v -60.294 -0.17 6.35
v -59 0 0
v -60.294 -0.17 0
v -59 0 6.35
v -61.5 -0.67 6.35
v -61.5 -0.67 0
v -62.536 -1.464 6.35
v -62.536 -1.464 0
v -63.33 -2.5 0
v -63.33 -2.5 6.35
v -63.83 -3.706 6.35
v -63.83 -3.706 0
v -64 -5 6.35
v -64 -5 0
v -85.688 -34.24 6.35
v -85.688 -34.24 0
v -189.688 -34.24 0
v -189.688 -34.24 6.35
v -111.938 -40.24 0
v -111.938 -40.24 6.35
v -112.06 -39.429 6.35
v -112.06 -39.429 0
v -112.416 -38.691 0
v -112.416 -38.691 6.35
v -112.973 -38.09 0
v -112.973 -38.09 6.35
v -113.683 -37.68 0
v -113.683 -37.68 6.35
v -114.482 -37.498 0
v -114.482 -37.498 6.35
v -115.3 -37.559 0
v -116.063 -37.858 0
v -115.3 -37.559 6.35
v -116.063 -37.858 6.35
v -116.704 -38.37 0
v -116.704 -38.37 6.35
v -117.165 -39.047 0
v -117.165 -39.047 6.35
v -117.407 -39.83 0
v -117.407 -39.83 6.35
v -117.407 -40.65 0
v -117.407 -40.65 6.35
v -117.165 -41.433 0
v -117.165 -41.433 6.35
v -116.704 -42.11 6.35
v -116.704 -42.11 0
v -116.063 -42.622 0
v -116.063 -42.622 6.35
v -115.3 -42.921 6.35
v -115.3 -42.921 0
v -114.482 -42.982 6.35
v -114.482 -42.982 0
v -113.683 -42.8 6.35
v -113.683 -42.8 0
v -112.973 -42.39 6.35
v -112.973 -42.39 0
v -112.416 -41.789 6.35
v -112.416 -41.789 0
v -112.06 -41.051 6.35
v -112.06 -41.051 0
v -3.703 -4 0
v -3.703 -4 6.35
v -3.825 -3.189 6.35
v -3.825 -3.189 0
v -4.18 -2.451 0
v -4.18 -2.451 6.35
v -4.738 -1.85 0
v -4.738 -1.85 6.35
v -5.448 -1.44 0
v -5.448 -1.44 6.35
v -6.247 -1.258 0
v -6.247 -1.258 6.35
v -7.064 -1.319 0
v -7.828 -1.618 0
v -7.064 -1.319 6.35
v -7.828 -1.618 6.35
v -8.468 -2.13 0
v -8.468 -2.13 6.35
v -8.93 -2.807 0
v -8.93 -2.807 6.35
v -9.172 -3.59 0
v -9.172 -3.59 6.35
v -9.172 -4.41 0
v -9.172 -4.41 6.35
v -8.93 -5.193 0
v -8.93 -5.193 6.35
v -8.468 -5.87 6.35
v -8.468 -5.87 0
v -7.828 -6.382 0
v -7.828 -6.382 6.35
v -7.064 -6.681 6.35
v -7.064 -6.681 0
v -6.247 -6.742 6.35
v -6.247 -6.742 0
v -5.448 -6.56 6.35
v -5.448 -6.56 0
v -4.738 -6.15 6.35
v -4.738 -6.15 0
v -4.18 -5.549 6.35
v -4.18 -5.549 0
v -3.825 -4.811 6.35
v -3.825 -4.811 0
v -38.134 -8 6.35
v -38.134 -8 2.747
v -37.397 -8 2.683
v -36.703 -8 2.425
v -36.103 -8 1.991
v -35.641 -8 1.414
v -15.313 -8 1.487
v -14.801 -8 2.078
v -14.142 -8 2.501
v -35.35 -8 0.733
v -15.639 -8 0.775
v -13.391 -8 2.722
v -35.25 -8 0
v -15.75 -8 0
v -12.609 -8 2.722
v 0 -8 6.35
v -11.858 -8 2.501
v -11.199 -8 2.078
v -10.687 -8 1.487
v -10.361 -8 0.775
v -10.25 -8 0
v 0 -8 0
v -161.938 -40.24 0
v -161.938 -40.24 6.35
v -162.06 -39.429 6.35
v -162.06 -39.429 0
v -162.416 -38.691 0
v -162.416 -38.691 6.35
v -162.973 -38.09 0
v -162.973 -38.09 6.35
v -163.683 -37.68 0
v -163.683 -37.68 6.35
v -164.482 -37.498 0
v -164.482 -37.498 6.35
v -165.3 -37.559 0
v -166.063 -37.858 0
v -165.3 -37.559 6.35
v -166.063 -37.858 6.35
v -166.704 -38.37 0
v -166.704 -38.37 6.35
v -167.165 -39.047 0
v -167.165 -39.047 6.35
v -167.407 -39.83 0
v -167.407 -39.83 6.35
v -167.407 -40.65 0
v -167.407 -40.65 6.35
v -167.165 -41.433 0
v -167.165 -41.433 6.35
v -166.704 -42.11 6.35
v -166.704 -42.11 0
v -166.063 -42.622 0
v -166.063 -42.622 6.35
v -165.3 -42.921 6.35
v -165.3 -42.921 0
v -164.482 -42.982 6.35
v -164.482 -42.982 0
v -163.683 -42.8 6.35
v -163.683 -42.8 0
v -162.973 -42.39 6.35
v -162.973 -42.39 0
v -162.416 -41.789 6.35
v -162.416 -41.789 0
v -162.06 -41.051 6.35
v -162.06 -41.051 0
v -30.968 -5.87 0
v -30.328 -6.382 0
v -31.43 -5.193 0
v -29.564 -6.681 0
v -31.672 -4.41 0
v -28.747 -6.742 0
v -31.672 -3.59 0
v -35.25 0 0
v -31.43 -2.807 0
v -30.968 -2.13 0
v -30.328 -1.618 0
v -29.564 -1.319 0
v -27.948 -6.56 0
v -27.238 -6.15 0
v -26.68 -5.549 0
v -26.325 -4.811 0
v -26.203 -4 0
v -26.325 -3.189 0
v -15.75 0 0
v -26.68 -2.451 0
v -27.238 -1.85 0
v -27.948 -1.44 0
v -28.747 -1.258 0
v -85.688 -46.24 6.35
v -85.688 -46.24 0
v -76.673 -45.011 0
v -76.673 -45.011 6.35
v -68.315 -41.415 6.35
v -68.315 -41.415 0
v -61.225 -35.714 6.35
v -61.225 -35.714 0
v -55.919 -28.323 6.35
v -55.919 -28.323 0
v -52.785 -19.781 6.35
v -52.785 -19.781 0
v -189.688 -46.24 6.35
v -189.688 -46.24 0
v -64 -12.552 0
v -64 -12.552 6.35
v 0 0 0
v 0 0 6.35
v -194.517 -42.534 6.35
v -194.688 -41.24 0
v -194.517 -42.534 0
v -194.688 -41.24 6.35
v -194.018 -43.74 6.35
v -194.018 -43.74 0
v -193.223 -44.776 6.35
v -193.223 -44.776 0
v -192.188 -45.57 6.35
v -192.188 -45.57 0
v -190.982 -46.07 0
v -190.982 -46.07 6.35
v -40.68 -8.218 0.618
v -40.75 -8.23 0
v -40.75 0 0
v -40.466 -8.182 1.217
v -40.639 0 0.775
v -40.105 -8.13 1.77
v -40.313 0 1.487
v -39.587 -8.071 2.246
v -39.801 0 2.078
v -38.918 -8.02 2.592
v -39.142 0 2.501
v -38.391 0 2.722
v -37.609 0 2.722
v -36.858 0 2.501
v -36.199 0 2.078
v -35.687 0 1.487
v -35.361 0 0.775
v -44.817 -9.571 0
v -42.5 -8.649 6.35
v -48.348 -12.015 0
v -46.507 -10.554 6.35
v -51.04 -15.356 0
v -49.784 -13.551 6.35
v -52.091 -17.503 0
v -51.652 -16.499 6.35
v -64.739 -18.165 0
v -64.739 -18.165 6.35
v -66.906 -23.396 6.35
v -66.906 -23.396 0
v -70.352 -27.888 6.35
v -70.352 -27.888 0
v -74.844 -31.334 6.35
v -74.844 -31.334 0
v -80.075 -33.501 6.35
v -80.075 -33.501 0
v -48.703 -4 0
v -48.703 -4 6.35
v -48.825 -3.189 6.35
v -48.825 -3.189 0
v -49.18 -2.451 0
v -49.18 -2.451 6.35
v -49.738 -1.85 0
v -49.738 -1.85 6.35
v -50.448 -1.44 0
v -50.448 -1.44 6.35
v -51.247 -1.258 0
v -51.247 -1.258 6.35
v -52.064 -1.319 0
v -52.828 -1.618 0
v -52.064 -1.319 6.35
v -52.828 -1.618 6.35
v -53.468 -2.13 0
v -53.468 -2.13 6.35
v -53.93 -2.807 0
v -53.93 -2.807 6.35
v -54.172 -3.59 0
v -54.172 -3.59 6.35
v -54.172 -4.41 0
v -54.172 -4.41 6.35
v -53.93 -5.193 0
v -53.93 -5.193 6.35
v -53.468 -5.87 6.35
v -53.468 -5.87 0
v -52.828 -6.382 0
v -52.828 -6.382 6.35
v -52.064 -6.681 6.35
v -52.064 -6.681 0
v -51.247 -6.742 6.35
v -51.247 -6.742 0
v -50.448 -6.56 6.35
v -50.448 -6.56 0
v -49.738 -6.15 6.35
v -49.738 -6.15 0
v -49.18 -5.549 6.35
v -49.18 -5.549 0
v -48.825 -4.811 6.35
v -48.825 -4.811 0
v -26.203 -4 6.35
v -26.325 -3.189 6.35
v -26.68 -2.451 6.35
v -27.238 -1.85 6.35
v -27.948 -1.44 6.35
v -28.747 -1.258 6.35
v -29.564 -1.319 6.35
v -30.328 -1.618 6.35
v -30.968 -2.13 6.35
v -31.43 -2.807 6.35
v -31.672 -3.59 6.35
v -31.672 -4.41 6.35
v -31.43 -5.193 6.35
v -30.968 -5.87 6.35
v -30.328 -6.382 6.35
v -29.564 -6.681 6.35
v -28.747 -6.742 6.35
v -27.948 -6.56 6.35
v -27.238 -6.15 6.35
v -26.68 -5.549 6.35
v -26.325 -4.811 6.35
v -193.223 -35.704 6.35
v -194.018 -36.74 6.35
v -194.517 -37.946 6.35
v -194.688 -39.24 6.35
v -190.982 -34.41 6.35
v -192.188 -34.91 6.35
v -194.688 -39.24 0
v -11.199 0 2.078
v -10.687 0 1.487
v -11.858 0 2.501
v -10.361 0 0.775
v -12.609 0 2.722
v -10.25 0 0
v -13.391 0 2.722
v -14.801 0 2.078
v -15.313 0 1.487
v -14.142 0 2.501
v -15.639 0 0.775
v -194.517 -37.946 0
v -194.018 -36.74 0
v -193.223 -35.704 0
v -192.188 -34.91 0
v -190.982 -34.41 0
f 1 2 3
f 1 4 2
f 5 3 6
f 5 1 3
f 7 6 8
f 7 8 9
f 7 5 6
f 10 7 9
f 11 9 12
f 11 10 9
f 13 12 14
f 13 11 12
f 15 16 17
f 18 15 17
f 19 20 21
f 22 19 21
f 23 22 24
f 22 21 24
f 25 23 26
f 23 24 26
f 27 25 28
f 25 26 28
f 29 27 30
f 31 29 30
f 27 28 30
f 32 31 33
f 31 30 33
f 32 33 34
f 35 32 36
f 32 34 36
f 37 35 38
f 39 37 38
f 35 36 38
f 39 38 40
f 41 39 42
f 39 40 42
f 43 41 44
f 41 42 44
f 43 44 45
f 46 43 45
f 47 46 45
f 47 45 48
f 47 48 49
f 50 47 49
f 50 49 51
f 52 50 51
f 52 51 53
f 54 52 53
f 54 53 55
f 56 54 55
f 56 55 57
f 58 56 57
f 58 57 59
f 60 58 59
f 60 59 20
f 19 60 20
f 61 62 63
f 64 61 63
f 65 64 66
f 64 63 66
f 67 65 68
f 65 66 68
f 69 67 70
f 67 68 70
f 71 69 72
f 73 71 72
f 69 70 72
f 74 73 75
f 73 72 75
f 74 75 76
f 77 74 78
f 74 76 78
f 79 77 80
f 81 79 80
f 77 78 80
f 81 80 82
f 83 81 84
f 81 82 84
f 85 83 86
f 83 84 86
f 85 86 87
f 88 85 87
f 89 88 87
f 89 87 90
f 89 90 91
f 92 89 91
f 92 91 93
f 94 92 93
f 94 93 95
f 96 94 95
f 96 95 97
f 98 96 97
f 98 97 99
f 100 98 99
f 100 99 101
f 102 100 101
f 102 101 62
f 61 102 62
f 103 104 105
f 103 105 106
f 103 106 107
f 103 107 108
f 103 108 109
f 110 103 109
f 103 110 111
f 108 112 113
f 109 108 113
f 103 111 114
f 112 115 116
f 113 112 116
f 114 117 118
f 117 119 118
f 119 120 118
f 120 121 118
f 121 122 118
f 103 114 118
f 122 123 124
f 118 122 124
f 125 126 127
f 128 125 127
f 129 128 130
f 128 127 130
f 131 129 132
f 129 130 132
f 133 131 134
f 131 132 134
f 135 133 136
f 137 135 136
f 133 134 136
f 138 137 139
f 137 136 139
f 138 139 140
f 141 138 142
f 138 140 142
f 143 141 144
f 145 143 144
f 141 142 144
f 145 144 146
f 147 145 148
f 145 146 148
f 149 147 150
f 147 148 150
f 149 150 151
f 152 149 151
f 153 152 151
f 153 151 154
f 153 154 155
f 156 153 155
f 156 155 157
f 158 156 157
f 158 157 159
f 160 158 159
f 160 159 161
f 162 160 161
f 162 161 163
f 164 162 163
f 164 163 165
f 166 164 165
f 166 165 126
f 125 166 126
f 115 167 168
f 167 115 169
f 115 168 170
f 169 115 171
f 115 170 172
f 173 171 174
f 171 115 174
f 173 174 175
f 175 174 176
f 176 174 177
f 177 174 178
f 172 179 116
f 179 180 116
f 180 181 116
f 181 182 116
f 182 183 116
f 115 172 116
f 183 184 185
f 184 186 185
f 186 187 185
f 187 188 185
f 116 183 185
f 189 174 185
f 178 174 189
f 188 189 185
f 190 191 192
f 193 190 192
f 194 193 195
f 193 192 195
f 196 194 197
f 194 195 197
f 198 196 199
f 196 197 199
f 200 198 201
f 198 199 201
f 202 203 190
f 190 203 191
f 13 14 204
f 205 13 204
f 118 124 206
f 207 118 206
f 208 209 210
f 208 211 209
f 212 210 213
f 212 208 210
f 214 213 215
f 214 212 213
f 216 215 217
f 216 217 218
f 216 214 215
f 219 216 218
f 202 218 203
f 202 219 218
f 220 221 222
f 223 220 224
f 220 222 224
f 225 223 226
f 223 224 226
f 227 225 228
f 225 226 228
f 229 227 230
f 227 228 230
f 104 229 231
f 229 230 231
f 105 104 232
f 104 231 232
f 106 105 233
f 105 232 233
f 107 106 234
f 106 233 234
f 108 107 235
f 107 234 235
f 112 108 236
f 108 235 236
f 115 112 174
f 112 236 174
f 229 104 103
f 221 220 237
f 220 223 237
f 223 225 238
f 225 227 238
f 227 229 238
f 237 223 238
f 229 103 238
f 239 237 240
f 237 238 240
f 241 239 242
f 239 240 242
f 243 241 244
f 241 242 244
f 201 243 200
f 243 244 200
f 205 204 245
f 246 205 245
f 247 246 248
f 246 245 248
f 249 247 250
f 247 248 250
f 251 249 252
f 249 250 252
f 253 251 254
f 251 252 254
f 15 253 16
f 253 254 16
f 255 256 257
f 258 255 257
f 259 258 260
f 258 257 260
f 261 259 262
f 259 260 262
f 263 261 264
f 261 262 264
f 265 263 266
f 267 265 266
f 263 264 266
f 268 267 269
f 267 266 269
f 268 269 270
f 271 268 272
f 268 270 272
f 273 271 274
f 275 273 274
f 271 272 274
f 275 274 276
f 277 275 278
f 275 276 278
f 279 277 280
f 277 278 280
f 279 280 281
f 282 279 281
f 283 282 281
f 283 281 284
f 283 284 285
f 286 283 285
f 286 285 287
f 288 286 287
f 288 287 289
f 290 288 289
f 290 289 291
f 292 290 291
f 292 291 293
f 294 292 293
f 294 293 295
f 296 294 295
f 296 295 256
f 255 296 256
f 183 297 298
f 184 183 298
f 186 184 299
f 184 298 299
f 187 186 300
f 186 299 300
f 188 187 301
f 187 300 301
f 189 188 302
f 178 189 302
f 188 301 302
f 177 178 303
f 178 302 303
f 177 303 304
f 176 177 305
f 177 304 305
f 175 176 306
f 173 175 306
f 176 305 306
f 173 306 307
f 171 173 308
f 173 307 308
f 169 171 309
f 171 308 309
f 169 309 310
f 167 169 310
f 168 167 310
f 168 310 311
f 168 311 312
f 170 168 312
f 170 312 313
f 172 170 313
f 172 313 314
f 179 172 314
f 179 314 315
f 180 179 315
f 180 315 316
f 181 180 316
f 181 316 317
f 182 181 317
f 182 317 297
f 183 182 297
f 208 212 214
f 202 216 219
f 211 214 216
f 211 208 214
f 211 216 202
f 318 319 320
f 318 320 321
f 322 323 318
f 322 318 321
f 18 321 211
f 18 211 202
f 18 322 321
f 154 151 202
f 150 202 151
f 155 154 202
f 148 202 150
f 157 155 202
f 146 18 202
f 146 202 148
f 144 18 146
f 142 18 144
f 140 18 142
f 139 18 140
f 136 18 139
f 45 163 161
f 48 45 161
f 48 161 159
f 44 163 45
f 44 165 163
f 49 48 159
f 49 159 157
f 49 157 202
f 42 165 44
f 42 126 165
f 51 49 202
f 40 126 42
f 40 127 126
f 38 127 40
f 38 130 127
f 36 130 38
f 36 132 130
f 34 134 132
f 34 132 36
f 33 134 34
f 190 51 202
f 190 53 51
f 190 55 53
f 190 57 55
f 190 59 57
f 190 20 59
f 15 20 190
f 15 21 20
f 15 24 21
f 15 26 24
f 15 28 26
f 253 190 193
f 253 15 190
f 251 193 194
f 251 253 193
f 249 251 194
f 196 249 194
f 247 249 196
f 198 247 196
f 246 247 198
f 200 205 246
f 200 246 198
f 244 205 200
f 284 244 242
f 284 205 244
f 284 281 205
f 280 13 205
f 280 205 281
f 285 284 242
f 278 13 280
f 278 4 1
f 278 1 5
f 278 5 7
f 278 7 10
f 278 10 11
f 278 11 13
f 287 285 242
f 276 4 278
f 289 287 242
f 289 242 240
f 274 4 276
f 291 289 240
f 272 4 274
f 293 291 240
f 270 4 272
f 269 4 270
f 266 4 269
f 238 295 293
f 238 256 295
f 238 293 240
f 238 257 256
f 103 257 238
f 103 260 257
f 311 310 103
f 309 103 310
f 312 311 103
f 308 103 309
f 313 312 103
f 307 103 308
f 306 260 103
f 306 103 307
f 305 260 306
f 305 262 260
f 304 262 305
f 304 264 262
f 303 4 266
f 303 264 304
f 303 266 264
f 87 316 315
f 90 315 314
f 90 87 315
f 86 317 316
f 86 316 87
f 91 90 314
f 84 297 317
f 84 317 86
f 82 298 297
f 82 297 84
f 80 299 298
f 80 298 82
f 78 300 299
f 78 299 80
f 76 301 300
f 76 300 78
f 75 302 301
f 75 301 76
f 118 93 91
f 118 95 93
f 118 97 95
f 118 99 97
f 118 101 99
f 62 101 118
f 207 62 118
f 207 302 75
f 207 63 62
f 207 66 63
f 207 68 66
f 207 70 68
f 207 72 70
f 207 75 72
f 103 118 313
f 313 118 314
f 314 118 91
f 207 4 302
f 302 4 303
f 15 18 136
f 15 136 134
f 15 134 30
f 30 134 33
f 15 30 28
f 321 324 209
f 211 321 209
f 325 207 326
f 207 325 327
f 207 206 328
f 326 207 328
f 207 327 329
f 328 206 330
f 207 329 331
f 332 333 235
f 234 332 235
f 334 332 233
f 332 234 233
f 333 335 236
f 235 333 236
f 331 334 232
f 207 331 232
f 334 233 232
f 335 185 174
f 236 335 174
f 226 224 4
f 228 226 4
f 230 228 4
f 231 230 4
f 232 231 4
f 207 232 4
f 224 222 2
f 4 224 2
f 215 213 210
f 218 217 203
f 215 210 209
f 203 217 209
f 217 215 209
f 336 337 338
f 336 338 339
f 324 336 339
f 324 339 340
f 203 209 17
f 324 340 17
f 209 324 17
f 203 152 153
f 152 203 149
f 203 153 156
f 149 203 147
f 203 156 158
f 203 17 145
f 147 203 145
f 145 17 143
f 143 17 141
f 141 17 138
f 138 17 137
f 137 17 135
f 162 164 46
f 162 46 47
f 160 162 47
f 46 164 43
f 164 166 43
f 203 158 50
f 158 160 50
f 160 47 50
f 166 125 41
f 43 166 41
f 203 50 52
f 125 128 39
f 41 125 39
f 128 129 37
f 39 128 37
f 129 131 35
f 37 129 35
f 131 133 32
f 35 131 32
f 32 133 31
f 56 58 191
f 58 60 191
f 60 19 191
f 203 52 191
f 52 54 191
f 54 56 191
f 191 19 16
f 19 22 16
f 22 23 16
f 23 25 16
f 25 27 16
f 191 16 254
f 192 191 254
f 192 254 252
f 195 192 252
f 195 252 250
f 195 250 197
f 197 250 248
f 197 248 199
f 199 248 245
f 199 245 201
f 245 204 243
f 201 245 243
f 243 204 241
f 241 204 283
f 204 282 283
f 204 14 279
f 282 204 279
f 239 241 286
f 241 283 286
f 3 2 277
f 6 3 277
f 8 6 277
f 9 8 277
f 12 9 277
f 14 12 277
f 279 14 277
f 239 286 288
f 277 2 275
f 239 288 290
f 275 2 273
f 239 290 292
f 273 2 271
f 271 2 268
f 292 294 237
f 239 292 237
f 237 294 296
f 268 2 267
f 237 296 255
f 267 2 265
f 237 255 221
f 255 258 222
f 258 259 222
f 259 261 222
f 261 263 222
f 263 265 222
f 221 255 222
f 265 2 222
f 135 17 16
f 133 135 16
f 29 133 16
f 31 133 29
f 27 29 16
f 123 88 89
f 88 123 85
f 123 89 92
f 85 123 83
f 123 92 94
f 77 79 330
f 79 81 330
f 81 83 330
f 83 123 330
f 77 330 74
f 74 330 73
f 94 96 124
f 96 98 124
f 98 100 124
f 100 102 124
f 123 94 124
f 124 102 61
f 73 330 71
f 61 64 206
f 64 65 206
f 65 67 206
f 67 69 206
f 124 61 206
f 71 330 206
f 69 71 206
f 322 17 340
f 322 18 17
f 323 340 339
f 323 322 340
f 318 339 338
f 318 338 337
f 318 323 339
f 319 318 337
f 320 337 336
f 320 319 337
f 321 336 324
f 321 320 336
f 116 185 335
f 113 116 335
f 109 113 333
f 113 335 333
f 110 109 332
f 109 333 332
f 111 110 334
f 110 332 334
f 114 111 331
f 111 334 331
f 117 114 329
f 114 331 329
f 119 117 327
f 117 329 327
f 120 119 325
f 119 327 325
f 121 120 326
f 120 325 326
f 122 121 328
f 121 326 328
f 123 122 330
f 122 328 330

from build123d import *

# Parameters (mm, degrees)
BOSS_EXTRUDE1_DEPTH = 6.35
FILLET1_R           = 5
FILLET2_R           = 15
SKETCH4_R           = 2.75
CUT_EXTRUDE2_DEPTH  = 10
CUT_EXTRUDE3_REACH  = 48.24
SKETCH3_R           = 2.75


with BuildPart() as part:
    # Sketch1 → Boss-Extrude1 (new body)
    with BuildSketch(Plane.XY):
        with BuildLine():
            Line((0, 0), (-64, 0))
            Line((-64, 0), (-64, -12.552169744))
            ThreePointArc((-64, -12.552169744), (-70.352218413, -27.887781587), (-85.687830256, -34.24))
            Line((-85.687830256, -34.24), (-194.687830256, -34.24))
            Line((-194.687830256, -34.24), (-194.687830256, -46.24))
            Line((-194.687830256, -46.24), (-85.687830256, -46.24))
            ThreePointArc((-85.687830256, -46.24), (-61.866937038, -36.373062962), (-52, -12.552169744))
            Line((-52, -12.552169744), (-52, -8))
            Line((-52, -8), (0, -8))
            Line((0, -8), (0, 0))
        make_face()
    extrude(amount=BOSS_EXTRUDE1_DEPTH)

    # Fillet1
    fillet1_edges = [part.edges().sort_by_distance(p)[0] for p in [
        (-194.687830256, -46.24, 3.175),
        (-194.687830256, -34.24, 3.175),
        (-64, 0, 3.175),
    ]]
    fillet(fillet1_edges, radius=FILLET1_R)

    # Fillet2
    fillet2_edges = [part.edges().sort_by_distance(p)[0] for p in [
        (-52, -8, 3.175),
    ]]
    fillet(fillet2_edges, radius=FILLET2_R)

    # Sketch4 → Cut-Extrude2 (cut)
    with BuildSketch(Plane.XY.offset(6.35)):
        with Locations((-164.687830256, -40.24)):
            Circle(SKETCH4_R)
        with Locations((-114.687830256, -40.24)):
            Circle(SKETCH4_R)
        with Locations((-6.452530622, -4)):
            Circle(SKETCH4_R)
        with Locations((-28.952530622, -4)):
            Circle(SKETCH4_R)
        with Locations((-51.452530622, -4)):
            Circle(SKETCH4_R)
    extrude(amount=-CUT_EXTRUDE2_DEPTH, mode=Mode.SUBTRACT)

    # Sketch3 → Cut-Extrude3 (cut, up to next)
    with BuildSketch(Plane(origin=(0, 0, 0), x_dir=(1, 0, 0), z_dir=(0, 1, 0)), mode=Mode.PRIVATE) as cut_extrude3_sk1:
        with Locations((-13, 0)):
            Circle(SKETCH3_R)
    cut_extrude3_tool1 = extrude(cut_extrude3_sk1.sketch, amount=-CUT_EXTRUDE3_REACH, mode=Mode.PRIVATE) & part.part
    add(cut_extrude3_tool1.solids().sort_by_distance((-13, 0, 0))[0], mode=Mode.SUBTRACT)
    # Sketch3 → Cut-Extrude3 (cut, up to next)
    with BuildSketch(Plane(origin=(0, 0, 0), x_dir=(1, 0, 0), z_dir=(0, 1, 0)), mode=Mode.PRIVATE) as cut_extrude3_sk2:
        with Locations((-38, 0)):
            Circle(SKETCH3_R)
    cut_extrude3_tool2 = extrude(cut_extrude3_sk2.sketch, amount=-CUT_EXTRUDE3_REACH, mode=Mode.PRIVATE) & part.part
    add(cut_extrude3_tool2.solids().sort_by_distance((-38, 0, 0))[0], mode=Mode.SUBTRACT)


solid = part.part
